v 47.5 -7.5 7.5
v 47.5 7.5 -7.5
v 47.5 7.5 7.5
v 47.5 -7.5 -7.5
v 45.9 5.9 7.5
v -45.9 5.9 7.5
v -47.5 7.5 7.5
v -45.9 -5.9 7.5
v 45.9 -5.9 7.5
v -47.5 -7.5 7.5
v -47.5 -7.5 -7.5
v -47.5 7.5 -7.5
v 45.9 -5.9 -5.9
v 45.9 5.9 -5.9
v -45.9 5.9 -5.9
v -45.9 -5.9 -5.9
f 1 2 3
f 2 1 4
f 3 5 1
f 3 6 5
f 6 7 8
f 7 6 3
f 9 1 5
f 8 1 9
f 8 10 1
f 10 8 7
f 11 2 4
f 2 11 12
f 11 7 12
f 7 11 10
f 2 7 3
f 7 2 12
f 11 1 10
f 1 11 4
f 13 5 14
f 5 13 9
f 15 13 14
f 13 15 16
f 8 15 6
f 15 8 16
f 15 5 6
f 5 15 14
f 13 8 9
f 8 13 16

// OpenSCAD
w=95;
h=15;
d=15;

t=1.6;

difference(){
    cube([w,d,h], true);  
    translate([0,0,t])  
    #cube([w-t*2,d-t*2,h],true);
}
